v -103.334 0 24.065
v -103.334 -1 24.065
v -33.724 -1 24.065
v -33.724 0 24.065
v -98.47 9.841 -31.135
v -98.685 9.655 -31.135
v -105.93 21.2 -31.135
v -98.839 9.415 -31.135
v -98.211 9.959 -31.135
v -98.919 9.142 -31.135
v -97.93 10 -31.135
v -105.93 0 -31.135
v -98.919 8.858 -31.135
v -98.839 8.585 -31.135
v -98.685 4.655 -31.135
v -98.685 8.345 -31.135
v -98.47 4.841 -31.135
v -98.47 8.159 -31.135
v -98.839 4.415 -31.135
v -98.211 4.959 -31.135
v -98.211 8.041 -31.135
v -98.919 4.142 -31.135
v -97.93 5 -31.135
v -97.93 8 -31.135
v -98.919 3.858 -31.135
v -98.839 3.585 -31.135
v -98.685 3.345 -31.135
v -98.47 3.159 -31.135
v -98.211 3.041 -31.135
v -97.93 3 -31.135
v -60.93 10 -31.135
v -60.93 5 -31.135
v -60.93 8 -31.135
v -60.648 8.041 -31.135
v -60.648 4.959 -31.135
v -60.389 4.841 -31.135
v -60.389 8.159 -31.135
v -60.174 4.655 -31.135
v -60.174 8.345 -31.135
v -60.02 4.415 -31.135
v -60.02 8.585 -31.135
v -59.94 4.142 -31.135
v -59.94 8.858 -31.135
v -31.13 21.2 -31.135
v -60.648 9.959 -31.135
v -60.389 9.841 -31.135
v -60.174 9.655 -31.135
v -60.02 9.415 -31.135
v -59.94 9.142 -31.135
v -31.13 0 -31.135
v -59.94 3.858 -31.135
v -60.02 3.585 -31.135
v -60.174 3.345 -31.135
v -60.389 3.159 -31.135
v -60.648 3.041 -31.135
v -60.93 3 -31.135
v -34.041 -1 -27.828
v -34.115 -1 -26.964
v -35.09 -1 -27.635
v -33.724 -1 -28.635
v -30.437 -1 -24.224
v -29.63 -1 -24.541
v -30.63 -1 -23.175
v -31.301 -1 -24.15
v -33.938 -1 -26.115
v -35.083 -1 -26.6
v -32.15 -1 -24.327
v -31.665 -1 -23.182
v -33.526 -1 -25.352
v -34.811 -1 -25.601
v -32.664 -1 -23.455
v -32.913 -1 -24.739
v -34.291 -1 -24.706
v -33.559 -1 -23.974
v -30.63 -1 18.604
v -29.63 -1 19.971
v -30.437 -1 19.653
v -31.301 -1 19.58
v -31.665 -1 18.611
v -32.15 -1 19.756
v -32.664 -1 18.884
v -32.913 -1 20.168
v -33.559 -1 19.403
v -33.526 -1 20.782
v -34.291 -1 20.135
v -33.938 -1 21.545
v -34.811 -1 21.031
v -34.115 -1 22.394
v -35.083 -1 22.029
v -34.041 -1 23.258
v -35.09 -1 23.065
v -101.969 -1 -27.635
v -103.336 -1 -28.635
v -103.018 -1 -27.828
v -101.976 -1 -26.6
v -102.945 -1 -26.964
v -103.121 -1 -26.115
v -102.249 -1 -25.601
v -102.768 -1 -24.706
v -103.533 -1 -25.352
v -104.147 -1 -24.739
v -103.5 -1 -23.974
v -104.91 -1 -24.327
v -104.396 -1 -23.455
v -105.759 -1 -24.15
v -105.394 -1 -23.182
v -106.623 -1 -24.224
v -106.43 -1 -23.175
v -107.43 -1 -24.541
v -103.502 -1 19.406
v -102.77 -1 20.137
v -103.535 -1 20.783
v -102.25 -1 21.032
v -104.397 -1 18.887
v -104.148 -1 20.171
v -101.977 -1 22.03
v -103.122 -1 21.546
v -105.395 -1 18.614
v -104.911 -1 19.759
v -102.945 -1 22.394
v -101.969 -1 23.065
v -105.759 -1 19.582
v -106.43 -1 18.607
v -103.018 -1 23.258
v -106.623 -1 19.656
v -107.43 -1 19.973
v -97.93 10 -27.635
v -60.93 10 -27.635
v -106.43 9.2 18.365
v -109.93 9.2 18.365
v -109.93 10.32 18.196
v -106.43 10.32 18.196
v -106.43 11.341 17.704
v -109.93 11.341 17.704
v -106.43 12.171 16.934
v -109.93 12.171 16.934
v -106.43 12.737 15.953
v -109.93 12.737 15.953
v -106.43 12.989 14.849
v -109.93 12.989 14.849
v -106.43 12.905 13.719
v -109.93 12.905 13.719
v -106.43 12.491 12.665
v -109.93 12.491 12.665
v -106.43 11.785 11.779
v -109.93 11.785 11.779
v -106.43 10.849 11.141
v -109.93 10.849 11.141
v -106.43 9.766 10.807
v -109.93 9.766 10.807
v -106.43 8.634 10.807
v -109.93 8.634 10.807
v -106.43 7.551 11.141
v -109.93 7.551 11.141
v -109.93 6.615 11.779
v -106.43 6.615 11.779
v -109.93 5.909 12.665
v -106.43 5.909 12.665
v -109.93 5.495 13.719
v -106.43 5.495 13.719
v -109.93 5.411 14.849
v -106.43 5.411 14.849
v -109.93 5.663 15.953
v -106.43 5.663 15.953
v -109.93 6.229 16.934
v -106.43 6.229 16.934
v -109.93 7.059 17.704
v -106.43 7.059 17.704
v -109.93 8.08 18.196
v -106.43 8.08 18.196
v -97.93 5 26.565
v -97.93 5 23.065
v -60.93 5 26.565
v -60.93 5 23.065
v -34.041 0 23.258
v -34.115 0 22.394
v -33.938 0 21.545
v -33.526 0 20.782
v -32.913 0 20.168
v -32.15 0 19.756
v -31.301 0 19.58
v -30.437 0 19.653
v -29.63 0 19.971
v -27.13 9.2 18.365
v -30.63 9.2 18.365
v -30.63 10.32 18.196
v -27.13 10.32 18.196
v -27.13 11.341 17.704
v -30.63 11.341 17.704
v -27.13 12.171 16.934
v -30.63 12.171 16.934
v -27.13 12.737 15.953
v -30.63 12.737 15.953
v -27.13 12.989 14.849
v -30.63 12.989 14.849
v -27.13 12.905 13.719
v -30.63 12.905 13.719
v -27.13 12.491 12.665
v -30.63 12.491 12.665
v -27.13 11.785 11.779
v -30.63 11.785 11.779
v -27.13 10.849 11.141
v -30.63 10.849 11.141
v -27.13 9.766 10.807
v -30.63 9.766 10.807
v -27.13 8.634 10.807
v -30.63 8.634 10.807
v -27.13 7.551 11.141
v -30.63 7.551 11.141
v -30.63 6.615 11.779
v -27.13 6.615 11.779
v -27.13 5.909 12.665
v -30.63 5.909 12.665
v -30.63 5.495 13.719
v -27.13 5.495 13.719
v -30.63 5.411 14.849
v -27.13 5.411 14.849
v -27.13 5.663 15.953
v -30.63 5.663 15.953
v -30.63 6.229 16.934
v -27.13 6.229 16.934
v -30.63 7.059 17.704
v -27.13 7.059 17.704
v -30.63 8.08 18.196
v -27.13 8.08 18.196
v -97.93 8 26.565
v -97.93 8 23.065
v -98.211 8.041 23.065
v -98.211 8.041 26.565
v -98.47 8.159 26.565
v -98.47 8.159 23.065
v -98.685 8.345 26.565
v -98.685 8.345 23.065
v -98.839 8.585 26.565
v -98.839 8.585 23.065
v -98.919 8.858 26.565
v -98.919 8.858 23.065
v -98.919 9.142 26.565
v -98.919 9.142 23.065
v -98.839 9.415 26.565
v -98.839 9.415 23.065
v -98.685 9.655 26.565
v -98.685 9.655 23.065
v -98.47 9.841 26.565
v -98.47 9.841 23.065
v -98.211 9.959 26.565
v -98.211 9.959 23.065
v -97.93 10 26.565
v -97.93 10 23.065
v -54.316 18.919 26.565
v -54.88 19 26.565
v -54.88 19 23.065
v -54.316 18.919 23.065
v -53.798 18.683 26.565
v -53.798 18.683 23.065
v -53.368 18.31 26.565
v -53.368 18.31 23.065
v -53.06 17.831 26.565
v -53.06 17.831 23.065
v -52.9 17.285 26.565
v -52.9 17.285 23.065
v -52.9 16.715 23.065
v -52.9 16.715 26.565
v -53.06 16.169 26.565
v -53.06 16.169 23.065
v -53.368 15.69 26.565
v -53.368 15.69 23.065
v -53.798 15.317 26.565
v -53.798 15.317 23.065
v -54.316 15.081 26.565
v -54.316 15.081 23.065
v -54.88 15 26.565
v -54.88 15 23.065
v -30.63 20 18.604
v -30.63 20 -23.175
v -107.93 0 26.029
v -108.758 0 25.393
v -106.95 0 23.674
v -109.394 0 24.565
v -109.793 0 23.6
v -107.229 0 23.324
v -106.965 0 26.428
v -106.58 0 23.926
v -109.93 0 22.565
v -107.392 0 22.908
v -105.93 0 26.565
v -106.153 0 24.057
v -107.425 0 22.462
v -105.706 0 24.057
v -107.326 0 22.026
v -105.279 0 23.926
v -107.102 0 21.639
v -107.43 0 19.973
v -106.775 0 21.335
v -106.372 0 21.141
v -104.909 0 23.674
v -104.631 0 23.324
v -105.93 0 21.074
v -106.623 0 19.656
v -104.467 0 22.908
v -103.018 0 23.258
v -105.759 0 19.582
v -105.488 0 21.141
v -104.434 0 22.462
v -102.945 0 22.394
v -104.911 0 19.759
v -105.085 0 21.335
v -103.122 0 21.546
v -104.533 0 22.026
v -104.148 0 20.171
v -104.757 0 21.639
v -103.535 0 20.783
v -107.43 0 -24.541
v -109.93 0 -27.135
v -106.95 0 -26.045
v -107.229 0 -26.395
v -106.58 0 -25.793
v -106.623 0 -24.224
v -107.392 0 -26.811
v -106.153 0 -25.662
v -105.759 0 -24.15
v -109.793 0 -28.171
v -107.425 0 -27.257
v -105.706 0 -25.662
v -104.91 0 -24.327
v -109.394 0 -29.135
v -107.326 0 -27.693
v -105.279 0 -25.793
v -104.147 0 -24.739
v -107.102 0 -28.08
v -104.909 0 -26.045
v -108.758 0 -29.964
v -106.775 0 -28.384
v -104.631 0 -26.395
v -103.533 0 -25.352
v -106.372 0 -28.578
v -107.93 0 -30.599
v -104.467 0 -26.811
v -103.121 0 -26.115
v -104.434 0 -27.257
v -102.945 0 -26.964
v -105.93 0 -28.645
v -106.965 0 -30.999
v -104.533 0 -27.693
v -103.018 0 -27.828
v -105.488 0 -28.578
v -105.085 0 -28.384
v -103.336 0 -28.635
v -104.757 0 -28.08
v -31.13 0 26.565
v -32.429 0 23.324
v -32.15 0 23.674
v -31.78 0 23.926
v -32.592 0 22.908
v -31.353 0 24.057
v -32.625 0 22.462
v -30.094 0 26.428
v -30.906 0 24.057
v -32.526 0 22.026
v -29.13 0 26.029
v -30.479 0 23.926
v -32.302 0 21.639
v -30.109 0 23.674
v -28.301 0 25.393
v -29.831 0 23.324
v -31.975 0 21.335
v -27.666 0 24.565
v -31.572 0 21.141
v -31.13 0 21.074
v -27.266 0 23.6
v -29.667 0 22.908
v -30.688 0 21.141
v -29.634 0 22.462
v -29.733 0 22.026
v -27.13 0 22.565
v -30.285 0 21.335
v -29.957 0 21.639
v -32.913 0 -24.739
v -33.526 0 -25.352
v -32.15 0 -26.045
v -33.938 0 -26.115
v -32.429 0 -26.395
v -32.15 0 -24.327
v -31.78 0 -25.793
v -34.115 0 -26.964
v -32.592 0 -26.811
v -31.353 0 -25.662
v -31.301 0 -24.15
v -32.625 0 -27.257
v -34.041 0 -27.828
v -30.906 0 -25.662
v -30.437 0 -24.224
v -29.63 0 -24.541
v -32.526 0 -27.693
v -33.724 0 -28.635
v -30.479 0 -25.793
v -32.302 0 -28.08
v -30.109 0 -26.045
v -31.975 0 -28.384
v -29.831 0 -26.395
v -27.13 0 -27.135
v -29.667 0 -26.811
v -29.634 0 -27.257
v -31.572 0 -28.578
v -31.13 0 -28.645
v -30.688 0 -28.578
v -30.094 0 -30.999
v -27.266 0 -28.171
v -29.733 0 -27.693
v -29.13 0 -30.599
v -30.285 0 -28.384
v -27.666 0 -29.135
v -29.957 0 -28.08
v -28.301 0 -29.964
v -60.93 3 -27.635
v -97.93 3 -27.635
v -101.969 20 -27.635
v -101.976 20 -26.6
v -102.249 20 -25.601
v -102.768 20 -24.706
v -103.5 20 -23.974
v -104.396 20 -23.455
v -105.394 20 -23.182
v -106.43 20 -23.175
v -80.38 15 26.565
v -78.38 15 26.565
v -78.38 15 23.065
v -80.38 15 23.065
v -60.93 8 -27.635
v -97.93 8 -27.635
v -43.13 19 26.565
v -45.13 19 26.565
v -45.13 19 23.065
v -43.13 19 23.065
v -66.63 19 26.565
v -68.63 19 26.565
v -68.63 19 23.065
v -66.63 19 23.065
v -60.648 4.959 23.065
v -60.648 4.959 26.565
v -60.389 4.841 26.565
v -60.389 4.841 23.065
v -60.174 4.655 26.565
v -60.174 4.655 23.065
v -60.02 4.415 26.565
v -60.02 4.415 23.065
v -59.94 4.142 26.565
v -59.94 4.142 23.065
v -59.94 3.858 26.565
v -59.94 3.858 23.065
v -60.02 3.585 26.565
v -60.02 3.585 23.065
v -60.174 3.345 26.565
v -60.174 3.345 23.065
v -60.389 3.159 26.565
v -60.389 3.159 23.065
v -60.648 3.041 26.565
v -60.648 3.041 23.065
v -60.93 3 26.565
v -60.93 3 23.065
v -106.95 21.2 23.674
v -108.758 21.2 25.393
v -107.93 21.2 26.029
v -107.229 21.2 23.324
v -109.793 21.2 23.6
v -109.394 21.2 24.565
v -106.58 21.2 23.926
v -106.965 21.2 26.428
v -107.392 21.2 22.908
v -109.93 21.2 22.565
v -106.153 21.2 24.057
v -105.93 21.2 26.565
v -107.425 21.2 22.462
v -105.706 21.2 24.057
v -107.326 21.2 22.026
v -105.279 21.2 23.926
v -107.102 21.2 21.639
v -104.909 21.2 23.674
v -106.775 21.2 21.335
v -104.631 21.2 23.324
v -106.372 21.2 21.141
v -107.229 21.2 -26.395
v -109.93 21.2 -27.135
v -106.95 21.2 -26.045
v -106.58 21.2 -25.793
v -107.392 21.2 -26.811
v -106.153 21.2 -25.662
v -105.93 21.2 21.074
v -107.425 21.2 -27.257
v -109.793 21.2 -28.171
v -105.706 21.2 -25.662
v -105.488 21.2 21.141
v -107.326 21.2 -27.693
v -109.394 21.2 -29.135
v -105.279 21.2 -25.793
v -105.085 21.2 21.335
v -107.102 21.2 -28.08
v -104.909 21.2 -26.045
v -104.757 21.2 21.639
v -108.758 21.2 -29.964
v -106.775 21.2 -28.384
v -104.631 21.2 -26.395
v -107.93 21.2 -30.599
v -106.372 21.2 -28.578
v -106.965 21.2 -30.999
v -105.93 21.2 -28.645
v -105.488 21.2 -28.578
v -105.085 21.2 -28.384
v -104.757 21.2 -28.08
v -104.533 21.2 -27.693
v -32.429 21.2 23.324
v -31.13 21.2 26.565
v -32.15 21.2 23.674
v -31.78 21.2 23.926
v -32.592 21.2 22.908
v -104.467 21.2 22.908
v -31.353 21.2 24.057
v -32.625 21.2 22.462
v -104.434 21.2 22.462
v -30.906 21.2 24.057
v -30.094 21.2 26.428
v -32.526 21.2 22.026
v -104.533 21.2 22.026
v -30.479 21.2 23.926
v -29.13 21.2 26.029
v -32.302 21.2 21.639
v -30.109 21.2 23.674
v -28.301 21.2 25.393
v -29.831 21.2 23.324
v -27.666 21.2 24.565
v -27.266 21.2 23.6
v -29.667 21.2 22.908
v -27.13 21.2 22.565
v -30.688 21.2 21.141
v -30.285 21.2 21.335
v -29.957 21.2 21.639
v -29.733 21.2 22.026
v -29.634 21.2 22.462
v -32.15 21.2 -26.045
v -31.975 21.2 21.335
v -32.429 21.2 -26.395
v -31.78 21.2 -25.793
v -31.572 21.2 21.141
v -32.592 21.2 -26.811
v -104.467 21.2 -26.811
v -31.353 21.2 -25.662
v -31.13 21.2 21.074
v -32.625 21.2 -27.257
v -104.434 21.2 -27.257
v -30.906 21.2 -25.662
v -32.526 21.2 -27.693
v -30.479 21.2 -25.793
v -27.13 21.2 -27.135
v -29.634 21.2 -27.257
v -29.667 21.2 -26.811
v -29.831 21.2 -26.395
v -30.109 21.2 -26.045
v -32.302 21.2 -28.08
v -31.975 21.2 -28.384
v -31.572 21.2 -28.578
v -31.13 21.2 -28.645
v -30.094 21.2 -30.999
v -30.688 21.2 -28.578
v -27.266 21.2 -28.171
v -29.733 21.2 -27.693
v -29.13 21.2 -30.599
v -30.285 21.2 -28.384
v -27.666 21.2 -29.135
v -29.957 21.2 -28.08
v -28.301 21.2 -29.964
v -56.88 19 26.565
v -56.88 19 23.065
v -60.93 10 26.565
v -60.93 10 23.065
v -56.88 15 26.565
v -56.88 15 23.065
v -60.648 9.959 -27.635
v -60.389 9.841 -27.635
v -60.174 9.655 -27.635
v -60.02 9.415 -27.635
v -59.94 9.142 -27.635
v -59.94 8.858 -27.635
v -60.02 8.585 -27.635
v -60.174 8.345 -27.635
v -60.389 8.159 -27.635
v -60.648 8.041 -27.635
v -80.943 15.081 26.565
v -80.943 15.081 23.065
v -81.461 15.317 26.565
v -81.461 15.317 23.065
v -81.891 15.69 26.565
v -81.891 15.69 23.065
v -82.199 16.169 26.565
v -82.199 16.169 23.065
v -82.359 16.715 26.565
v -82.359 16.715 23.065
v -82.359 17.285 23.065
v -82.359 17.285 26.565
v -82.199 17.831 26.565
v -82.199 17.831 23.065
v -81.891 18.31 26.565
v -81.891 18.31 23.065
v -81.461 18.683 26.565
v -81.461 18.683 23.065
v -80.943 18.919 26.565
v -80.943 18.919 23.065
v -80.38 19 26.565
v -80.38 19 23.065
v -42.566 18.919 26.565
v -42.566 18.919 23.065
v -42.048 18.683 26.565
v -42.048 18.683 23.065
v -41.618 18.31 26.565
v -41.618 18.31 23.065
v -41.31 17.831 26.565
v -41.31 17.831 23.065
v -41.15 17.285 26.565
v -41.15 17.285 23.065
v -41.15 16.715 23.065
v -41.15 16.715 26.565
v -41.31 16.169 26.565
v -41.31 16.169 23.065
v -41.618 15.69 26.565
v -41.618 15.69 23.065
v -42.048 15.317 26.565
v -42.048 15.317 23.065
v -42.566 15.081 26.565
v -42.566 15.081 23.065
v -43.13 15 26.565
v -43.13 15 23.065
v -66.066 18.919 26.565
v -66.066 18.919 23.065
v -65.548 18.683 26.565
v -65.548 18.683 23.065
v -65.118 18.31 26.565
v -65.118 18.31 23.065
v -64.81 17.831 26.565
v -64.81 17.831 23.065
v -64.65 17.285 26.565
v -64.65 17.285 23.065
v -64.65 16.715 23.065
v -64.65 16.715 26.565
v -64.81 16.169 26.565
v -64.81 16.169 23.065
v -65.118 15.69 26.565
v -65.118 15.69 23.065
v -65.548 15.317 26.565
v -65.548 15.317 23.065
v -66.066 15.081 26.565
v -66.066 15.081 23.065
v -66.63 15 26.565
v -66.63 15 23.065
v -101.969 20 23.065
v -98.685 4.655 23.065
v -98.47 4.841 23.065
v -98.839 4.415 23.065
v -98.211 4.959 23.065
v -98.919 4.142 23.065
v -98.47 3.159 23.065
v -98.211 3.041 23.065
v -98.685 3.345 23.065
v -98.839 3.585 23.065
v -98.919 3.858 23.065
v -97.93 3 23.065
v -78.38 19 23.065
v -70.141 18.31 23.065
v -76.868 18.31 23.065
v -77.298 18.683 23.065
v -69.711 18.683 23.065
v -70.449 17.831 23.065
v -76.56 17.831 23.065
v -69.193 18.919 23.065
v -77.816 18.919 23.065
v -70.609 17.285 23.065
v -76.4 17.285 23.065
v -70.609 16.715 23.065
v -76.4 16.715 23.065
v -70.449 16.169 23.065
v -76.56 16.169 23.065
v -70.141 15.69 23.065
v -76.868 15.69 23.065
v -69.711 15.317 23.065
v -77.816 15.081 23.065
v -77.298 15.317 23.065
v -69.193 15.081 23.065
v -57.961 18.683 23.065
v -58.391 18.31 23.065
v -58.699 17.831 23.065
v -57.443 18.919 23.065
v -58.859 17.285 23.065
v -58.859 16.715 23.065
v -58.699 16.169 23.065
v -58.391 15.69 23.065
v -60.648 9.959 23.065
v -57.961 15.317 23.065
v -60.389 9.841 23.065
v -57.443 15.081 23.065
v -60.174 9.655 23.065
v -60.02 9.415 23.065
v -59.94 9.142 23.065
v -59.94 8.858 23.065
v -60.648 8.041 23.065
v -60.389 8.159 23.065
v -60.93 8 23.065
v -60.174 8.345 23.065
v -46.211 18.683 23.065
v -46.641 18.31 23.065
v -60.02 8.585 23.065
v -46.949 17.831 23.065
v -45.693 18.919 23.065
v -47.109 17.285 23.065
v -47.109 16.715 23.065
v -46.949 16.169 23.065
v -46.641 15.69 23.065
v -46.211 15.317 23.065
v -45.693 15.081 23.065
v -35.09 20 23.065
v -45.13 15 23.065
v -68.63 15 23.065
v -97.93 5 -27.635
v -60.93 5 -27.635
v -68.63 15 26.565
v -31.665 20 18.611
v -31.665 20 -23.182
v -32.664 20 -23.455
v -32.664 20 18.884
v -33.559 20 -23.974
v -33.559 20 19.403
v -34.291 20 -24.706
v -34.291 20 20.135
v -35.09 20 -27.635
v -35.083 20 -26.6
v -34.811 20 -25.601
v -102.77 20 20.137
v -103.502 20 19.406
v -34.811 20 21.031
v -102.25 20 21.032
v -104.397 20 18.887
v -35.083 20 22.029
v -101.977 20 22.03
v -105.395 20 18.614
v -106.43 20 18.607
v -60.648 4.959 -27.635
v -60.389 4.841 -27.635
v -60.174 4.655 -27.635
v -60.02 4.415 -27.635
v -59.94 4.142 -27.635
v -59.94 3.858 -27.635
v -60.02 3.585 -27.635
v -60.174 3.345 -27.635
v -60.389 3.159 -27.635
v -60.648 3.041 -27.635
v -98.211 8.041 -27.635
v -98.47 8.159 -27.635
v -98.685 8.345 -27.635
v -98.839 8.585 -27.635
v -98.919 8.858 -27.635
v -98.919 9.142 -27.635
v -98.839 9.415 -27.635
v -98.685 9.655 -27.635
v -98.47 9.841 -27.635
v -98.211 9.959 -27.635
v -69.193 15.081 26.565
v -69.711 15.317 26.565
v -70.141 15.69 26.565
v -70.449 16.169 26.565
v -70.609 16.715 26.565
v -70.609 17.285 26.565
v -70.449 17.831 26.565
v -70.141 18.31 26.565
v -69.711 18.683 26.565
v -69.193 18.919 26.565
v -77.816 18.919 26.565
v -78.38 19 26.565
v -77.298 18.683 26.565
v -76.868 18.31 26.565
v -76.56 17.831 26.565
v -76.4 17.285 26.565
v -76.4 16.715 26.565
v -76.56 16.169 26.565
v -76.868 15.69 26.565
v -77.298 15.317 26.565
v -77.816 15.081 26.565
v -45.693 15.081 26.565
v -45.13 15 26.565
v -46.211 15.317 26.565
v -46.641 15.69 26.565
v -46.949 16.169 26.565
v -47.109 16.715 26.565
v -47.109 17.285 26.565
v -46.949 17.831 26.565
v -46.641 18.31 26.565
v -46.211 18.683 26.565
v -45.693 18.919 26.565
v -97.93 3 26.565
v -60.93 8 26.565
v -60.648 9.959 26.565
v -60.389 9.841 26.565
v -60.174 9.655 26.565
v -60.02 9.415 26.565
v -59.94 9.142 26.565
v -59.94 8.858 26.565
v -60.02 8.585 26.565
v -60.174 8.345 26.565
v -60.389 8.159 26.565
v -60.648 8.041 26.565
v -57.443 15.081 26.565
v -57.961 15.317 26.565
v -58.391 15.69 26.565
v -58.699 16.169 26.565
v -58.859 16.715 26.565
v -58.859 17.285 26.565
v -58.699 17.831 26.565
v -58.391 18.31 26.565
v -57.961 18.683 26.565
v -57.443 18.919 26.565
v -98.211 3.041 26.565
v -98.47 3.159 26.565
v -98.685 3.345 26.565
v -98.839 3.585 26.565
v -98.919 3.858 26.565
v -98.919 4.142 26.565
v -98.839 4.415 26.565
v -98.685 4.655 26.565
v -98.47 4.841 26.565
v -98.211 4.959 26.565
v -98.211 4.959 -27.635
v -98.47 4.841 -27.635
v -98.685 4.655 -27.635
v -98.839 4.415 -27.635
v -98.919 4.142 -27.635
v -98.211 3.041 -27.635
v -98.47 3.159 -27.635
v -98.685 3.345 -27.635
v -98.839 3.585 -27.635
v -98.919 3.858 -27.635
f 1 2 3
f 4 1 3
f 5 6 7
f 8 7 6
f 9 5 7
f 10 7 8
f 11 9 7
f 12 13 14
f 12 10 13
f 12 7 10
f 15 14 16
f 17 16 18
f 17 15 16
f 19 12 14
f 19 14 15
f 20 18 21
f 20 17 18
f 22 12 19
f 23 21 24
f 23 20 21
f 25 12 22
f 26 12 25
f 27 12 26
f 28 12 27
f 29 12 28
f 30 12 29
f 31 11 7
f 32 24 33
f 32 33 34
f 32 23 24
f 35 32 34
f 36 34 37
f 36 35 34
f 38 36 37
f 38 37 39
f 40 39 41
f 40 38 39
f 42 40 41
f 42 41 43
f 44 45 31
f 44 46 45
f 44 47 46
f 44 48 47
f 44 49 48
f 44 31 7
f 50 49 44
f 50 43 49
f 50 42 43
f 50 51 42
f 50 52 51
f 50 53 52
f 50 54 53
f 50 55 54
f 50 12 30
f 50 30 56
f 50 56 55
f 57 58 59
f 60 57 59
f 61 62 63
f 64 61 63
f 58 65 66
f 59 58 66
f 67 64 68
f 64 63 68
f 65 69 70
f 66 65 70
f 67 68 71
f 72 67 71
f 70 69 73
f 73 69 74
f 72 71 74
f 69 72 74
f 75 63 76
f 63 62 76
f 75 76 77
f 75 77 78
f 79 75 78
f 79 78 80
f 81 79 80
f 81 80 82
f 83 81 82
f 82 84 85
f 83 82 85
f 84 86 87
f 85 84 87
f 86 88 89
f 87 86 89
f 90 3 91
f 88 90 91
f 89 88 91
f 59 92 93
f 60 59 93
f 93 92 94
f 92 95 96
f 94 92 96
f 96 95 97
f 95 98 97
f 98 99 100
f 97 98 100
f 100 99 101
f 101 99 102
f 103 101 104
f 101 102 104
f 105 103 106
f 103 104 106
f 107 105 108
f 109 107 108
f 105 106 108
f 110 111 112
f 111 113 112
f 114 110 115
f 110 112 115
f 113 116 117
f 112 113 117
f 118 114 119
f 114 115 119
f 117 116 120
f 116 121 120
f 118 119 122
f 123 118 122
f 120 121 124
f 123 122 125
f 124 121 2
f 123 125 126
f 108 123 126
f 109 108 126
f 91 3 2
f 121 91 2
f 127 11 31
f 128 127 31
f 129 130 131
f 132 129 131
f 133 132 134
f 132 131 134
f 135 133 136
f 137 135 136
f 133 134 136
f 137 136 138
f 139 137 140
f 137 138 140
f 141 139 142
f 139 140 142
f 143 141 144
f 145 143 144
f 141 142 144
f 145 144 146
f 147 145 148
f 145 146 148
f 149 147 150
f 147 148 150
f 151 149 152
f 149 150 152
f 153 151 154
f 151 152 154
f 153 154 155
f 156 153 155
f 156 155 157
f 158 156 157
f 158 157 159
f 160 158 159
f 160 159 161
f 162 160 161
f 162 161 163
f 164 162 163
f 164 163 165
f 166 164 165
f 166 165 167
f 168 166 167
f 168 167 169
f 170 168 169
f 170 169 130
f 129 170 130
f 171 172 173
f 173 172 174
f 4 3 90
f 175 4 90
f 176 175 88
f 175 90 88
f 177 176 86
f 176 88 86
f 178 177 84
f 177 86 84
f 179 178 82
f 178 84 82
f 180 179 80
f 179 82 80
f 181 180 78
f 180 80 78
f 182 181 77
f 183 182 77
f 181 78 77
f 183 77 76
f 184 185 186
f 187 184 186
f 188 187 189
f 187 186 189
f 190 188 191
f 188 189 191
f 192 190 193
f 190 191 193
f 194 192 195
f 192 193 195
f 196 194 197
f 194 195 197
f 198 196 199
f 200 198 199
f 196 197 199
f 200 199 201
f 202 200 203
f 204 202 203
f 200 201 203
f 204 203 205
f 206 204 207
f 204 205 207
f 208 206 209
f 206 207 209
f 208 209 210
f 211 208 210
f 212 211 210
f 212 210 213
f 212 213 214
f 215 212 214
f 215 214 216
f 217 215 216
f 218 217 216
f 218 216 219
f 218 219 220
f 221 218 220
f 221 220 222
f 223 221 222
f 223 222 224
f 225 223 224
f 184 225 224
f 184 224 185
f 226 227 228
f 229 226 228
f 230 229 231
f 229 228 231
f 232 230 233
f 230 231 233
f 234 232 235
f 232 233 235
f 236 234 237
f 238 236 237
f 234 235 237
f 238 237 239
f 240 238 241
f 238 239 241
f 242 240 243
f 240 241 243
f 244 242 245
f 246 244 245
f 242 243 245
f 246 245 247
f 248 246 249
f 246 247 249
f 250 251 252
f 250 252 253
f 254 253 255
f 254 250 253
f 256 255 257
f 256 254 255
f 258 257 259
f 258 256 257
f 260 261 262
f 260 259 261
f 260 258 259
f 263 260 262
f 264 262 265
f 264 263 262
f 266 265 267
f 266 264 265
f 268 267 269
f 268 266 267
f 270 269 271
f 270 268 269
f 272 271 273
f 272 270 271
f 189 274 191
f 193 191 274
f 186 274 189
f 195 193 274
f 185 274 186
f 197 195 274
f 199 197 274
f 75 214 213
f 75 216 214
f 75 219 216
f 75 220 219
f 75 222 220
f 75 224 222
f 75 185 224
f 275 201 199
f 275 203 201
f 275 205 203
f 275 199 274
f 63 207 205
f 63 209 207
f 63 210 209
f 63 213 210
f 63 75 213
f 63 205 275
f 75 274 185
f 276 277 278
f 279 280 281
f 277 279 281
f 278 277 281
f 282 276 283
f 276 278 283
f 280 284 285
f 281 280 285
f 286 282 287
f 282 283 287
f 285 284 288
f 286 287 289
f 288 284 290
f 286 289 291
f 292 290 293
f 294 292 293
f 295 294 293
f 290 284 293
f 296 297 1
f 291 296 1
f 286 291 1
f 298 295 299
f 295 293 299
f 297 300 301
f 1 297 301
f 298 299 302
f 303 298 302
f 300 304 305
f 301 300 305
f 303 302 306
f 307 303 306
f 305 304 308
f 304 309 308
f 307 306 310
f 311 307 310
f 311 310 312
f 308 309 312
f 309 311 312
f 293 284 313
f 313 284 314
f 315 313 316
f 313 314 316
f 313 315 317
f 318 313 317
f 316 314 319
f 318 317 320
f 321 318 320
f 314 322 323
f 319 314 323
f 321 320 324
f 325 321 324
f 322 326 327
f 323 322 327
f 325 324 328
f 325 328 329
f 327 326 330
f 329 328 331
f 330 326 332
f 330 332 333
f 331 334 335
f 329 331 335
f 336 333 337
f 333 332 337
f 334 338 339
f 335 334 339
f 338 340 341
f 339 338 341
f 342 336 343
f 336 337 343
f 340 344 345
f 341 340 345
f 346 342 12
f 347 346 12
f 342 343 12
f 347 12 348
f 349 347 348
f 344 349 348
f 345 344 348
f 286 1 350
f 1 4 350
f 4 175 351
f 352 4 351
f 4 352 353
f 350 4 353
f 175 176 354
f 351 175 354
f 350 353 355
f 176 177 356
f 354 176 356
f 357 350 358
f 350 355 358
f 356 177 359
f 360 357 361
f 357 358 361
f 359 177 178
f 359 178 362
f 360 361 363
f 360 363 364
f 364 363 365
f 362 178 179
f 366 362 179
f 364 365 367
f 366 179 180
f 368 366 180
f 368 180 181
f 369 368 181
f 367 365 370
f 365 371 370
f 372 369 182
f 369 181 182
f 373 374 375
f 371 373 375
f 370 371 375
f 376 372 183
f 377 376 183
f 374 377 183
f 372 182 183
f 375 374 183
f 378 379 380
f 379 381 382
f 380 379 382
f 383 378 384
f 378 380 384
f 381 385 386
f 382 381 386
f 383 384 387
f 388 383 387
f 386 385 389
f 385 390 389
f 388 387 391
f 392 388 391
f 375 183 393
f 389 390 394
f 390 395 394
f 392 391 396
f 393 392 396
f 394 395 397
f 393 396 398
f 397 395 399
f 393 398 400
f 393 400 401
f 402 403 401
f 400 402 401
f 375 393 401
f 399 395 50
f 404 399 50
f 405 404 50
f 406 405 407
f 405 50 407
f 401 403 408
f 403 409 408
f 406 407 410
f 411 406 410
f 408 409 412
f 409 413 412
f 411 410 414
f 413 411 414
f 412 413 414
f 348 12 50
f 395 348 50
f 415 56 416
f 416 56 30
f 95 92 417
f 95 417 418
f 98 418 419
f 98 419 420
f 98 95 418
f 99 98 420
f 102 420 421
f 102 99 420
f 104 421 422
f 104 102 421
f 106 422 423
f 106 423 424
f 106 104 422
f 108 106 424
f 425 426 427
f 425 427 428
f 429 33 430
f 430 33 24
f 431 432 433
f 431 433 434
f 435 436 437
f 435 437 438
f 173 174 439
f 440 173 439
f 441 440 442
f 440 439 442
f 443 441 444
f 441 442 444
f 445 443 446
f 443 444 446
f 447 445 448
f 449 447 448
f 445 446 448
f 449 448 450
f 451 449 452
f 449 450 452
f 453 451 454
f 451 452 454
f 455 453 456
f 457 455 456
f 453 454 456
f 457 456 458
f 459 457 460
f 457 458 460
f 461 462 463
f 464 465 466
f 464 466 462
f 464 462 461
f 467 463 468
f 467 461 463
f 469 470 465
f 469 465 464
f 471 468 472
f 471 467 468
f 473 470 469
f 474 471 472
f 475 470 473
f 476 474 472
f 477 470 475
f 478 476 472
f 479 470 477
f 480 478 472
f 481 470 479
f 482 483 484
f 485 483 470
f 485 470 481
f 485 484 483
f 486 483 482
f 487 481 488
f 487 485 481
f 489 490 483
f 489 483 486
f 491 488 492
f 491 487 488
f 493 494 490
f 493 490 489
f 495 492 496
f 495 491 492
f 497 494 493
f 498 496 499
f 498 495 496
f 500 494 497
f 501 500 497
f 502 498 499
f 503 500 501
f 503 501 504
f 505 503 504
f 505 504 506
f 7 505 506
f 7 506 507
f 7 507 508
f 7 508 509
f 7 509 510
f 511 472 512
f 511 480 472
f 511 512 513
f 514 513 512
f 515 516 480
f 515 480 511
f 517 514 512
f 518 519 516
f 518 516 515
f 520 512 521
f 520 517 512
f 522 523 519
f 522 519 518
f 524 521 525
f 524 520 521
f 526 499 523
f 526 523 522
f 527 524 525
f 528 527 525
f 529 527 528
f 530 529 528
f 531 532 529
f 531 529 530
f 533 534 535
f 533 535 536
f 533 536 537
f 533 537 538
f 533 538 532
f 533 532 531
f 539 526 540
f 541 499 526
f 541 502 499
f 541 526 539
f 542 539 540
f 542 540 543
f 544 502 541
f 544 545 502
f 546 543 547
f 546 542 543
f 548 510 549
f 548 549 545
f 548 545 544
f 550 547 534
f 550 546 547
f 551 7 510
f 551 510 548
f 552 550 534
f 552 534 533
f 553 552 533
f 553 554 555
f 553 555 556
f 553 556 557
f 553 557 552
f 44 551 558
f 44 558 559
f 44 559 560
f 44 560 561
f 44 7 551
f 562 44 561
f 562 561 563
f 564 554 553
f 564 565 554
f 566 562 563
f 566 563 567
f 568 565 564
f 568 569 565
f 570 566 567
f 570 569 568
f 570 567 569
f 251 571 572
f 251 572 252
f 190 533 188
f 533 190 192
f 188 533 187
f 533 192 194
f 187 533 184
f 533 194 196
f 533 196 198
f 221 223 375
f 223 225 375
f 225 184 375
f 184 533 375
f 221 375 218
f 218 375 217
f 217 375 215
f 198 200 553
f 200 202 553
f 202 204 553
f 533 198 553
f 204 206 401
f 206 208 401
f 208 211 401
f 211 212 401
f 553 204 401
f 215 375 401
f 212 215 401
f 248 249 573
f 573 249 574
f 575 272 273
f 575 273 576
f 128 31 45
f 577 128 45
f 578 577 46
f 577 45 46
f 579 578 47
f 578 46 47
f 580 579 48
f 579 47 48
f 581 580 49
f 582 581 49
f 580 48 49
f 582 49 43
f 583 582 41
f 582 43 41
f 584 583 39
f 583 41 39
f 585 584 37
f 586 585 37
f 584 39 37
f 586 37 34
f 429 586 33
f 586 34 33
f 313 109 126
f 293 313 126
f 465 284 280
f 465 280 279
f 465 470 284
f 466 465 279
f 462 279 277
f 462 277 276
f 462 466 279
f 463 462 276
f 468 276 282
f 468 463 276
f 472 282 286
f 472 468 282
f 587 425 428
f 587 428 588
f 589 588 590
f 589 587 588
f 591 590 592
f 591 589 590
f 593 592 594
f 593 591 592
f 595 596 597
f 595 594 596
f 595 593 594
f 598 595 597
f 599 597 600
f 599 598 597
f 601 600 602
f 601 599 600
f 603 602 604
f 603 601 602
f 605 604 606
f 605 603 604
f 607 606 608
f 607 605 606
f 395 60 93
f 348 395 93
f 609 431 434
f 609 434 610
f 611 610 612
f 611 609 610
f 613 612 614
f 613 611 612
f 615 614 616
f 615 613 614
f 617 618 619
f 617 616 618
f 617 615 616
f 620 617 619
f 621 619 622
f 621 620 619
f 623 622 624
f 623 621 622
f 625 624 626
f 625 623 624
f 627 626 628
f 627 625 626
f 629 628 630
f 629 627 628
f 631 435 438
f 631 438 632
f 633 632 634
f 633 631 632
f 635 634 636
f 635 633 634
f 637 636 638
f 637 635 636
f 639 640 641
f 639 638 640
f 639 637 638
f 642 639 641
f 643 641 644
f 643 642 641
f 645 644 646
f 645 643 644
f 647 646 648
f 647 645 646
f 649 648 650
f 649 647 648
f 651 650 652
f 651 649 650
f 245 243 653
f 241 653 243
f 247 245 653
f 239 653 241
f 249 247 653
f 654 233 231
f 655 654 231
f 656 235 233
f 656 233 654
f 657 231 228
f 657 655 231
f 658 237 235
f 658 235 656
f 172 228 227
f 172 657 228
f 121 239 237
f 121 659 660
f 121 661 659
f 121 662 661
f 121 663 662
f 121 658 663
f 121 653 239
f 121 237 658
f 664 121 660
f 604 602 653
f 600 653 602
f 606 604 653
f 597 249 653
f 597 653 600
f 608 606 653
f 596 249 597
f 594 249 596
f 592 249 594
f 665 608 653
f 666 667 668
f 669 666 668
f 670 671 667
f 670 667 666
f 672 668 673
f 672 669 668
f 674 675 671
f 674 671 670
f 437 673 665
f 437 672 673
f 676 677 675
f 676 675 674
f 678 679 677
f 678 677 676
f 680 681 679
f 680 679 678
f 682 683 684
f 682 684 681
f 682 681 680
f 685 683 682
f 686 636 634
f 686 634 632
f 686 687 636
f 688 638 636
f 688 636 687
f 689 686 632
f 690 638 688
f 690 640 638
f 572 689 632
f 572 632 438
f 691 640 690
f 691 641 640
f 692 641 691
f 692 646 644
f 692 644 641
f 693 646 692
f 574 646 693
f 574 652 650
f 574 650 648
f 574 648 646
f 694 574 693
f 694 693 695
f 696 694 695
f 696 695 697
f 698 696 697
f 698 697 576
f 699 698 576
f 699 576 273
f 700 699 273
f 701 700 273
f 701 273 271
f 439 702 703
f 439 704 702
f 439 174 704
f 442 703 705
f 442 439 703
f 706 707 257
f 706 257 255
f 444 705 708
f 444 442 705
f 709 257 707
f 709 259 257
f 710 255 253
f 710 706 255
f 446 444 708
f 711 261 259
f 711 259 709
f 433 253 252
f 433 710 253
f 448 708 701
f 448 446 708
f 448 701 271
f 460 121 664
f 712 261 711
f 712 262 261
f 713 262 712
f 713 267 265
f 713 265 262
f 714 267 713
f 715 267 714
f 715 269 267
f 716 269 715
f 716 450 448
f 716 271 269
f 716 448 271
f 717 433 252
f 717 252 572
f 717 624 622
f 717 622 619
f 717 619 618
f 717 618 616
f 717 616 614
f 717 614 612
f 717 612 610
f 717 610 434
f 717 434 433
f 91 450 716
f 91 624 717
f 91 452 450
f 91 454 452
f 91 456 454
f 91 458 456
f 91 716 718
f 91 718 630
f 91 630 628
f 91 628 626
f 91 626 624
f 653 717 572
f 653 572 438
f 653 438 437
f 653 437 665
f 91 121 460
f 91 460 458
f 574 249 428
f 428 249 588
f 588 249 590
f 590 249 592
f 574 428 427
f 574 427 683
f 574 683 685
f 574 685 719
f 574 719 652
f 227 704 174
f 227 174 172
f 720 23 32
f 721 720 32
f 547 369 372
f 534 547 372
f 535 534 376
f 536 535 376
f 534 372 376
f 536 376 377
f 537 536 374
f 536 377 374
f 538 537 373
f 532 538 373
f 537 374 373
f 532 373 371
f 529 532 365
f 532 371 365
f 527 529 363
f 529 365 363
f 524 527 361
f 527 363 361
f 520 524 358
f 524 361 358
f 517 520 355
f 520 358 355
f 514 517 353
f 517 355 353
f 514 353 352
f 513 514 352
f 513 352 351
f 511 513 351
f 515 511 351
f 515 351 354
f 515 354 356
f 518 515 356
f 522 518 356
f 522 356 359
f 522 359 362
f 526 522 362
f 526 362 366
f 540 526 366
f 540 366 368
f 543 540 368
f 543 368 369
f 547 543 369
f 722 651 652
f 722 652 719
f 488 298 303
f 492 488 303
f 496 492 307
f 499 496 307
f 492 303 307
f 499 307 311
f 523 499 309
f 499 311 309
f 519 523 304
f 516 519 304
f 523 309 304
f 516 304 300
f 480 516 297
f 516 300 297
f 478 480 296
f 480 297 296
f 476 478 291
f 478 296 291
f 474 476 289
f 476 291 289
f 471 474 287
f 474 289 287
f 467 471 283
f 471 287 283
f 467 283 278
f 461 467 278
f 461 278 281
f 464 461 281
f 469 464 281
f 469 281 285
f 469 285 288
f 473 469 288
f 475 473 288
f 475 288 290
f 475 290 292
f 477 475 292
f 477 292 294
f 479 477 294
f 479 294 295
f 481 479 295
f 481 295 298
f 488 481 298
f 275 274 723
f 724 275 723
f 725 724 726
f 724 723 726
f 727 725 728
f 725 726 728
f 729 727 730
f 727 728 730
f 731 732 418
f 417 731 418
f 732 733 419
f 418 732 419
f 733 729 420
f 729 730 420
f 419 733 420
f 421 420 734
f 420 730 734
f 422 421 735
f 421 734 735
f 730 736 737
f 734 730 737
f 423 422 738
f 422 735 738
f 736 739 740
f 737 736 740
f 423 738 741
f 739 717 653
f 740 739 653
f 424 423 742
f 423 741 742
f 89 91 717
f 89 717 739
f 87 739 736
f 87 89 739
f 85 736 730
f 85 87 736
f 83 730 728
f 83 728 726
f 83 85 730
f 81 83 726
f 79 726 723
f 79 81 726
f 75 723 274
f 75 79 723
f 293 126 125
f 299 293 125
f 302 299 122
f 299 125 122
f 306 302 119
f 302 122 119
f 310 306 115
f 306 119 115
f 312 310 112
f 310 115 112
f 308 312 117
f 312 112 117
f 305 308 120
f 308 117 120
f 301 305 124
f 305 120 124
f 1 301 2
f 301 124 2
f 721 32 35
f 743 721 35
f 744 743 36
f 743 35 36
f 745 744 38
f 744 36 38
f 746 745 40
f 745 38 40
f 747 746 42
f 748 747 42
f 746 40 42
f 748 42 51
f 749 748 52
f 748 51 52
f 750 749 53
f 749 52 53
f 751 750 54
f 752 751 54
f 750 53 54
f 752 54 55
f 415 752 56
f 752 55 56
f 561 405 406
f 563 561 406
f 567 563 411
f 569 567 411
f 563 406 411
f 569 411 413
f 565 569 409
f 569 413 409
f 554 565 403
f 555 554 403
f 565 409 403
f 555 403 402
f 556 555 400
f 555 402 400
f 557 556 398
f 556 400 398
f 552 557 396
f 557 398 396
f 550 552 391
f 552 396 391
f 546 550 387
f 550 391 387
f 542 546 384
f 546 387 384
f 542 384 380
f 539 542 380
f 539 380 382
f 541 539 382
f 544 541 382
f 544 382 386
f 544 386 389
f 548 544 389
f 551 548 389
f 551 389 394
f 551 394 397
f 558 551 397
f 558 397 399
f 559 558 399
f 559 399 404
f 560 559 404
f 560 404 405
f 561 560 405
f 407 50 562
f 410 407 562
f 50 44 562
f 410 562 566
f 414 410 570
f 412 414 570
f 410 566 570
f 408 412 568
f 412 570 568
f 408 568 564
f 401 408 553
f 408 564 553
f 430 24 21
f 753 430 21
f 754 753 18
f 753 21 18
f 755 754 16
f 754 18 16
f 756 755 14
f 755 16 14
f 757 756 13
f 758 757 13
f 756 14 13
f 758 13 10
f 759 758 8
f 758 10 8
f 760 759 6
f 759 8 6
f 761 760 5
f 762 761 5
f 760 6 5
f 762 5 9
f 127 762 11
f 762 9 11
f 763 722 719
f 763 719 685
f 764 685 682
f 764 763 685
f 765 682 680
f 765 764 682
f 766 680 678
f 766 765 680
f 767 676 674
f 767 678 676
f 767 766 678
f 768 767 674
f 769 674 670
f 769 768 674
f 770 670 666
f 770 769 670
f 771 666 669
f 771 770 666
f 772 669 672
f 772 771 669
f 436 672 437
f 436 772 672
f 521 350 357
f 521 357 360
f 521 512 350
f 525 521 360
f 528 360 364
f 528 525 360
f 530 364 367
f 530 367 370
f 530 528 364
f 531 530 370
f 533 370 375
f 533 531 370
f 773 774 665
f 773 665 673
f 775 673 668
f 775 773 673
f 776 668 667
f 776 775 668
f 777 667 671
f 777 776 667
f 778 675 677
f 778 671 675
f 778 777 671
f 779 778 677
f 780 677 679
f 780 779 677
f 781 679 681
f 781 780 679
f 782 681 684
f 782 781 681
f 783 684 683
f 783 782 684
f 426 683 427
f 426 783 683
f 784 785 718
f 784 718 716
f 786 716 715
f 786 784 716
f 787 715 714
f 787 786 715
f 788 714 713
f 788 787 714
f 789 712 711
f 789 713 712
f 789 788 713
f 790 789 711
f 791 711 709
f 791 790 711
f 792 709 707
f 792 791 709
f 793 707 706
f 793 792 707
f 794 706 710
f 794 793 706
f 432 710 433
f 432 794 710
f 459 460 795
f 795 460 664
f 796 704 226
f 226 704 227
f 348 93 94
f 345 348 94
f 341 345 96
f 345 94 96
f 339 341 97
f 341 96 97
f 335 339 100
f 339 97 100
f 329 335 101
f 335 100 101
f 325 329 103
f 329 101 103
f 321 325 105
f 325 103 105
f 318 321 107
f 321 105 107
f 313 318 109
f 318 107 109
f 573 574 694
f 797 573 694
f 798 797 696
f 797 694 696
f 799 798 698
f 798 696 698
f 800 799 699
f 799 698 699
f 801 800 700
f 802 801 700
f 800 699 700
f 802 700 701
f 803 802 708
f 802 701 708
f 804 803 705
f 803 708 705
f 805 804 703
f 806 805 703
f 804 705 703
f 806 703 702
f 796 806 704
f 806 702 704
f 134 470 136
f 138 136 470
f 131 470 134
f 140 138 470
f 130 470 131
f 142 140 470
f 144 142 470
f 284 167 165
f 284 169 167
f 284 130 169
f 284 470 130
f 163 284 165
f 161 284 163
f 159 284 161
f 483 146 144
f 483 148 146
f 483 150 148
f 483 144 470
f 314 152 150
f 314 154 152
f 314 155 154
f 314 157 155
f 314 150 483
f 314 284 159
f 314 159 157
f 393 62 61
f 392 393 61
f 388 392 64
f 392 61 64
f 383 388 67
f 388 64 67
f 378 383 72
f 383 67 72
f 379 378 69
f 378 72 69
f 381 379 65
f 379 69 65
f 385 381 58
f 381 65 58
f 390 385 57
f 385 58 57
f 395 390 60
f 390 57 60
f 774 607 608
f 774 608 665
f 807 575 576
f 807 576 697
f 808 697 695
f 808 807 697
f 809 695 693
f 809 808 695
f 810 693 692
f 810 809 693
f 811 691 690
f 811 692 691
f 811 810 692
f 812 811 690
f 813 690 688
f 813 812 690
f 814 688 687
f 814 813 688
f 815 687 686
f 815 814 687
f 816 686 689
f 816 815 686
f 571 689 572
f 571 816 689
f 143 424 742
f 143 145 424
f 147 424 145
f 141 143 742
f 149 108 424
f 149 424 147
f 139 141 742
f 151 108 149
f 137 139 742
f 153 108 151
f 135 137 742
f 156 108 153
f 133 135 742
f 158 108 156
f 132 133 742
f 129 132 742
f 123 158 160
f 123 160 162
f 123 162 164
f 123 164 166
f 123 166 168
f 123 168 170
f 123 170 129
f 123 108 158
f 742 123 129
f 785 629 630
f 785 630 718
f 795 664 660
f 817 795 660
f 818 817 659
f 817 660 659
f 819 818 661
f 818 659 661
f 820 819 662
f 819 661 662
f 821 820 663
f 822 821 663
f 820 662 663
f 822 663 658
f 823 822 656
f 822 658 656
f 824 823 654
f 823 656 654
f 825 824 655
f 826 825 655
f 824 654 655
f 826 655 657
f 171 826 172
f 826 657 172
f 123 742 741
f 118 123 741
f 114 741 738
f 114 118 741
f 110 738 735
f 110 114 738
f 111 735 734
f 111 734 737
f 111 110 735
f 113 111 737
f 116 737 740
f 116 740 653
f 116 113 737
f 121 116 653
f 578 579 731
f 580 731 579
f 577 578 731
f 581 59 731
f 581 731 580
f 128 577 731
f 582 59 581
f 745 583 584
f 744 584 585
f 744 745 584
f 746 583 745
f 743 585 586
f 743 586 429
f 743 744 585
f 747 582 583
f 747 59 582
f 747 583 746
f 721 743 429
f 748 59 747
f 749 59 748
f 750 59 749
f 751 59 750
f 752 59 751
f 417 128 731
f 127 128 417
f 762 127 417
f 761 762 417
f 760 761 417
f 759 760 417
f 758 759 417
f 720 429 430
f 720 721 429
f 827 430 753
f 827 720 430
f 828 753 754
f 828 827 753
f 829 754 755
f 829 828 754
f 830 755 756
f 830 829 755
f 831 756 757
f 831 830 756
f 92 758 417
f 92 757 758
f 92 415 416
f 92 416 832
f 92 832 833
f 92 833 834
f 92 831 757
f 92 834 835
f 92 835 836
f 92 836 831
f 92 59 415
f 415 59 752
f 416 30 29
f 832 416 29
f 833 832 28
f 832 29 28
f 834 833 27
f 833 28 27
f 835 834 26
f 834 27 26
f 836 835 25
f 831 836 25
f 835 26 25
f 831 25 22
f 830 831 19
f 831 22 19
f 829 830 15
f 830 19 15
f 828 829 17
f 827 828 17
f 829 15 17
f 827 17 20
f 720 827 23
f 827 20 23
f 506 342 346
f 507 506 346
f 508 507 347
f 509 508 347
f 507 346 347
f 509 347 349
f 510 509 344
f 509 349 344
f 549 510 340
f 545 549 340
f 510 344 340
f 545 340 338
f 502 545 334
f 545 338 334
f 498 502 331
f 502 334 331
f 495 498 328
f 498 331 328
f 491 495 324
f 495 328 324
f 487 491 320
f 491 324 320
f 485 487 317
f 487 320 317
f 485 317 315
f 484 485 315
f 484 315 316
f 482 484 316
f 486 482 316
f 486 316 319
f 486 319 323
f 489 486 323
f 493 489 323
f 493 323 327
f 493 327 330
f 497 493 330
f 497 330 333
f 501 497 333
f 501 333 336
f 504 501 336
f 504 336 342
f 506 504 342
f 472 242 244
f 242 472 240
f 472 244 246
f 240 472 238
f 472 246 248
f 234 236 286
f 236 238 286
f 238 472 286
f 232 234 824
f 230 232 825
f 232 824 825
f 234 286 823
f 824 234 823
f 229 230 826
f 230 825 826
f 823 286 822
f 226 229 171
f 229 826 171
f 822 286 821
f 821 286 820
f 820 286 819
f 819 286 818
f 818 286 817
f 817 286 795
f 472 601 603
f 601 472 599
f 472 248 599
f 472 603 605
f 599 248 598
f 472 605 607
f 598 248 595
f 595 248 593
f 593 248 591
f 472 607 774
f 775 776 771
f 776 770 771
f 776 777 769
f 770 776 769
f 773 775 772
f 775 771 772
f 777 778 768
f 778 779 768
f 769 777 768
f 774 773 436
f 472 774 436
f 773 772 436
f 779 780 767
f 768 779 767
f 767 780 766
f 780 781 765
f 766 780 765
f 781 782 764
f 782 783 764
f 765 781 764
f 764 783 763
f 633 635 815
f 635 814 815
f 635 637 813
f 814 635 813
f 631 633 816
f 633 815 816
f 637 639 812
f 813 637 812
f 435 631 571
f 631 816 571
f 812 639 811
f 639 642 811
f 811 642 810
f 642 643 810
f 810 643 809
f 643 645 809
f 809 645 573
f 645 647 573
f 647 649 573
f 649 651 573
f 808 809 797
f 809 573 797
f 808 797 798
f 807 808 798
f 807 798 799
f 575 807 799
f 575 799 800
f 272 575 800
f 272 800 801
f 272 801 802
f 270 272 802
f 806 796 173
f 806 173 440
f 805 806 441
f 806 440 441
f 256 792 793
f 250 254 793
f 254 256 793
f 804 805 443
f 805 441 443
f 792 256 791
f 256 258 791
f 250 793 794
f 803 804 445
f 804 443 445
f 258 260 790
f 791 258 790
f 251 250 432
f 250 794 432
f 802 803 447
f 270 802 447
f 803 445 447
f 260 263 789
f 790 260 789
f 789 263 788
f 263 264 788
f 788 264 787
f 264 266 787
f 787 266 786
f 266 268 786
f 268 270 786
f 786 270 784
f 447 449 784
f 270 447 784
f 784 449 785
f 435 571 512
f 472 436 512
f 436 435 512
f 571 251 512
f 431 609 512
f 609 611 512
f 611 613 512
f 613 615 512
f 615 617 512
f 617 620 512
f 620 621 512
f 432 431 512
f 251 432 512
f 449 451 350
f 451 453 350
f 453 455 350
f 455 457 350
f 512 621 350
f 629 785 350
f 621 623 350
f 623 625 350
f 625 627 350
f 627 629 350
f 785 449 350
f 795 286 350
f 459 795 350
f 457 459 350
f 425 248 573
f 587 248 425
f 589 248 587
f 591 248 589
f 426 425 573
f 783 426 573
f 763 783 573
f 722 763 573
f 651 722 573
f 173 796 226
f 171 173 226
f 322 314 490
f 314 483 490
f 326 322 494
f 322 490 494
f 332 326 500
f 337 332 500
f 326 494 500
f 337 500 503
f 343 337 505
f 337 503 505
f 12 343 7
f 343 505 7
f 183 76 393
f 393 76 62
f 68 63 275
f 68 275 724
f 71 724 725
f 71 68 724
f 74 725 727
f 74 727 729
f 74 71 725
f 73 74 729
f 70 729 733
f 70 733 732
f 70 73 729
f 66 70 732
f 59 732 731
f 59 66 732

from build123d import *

# Parameters (mm, degrees)
SKETCH1_W           = 82.8
SKETCH1_H           = 57.7
BOSS_EXTRUDE1_DEPTH = 21.2
SKETCH2_R           = 1.5
CUT_EXTRUDE1_DEPTH  = 22
CUT_EXTRUDE2_DEPTH  = 20
FILLET3_R           = 4
BOSS_EXTRUDE3_START = 1
BOSS_EXTRUDE3_DEPTH = 1
CUT_EXTRUDE6_DEPTH  = 126.949440358
SKETCH8_R           = 3.8
CUT_EXTRUDE7_DEPTH  = 91.96532852
CUT_EXTRUDE8_DEPTH  = 10


with BuildPart() as part:
    # Sketch1 → Boss-Extrude1 (new body)
    with BuildSketch(Plane(origin=(0, 0, 0), x_dir=(1, 0, 0), z_dir=(0, 1, 0))):
        with Locations((-68.529666271, 2.285365627)):
            Rectangle(SKETCH1_W, SKETCH1_H)
    extrude(amount=BOSS_EXTRUDE1_DEPTH)

    # Sketch2 → Cut-Extrude1 (cut)
    with BuildSketch(Plane.XZ):
        with Locations((-105.929666271, 22.574078856)):
            Circle(SKETCH2_R)
        with Locations((-31.129666271, 22.574078856)):
            Circle(SKETCH2_R)
        with Locations((-105.929666271, -27.14481011)):
            Circle(SKETCH2_R)
        with Locations((-31.129666271, -27.14481011)):
            Circle(SKETCH2_R)
    extrude(amount=-CUT_EXTRUDE1_DEPTH, mode=Mode.SUBTRACT)

    # Sketch3 → Cut-Extrude2 (cut)
    with BuildSketch(Plane.XZ):
        with BuildLine():
            Line((-101.969305307, 23.064634373), (-35.090027235, 23.064634373))
            ThreePointArc((-35.090027235, 23.064634373), (-33.948648913, 19.745651731), (-30.629666271, 18.604273409))
            Line((-30.629666271, 18.604273409), (-30.629666271, -23.175004663))
            ThreePointArc((-30.629666271, -23.175004663), (-33.948648913, -24.316382985), (-35.090027235, -27.635365627))
            Line((-35.090027235, -27.635365627), (-101.969305307, -27.635365627))
            ThreePointArc((-101.969305307, -27.635365627), (-103.110683629, -24.316382985), (-106.429666271, -23.175004663))
            Line((-106.429666271, -23.175004663), (-106.429666271, 18.607164142))
            ThreePointArc((-106.429666271, 18.607164142), (-103.111962249, 19.747670443), (-101.969305307, 23.064634373))
        make_face()
    extrude(amount=-CUT_EXTRUDE2_DEPTH, mode=Mode.SUBTRACT)

    # Fillet3
    fillet3_edges = [part.edges().sort_by_distance(p)[0] for p in [
        (-27.129666271, 10.6, 26.564634373),
        (-109.929666271, 10.6, 26.564634373),
        (-109.929666271, 10.6, -31.135365627),
        (-27.129666271, 10.6, -31.135365627),
    ]]
    fillet(fillet3_edges, radius=FILLET3_R)

    # Sketch3<8> → Boss-Extrude3 (add)
    with BuildSketch(Plane.XZ.offset(BOSS_EXTRUDE3_START)):
        with BuildLine():
            Line((-103.334287863, 24.064634373), (-33.723727934, 24.064634373))
            ThreePointArc((-33.723727934, 24.064634373), (-33.241542132, 20.452758513), (-29.629666271, 19.97057271))
            Line((-29.629666271, 19.97057271), (-29.629666271, -24.541303964))
            ThreePointArc((-29.629666271, -24.541303964), (-33.241542132, -25.023489766), (-33.723727934, -28.635365627))
            Line((-33.723727934, -28.635365627), (-103.335604608, -28.635365627))
            ThreePointArc((-103.335604608, -28.635365627), (-103.817790411, -25.023489766), (-107.429666271, -24.541303964))
            Line((-107.429666271, -24.541303964), (-107.429666271, 19.973301106))
            ThreePointArc((-107.429666271, 19.973301106), (-103.819200468, 20.454646008), (-103.334287863, 24.064634373))
        make_face()
        with BuildLine():
            Line((-101.969305307, 23.064634373), (-35.090027235, 23.064634373))
            ThreePointArc((-35.090027235, 23.064634373), (-33.948648913, 19.745651731), (-30.629666271, 18.604273409))
            Line((-30.629666271, 18.604273409), (-30.629666271, -23.175004663))
            ThreePointArc((-30.629666271, -23.175004663), (-33.948648913, -24.316382985), (-35.090027235, -27.635365627))
            Line((-35.090027235, -27.635365627), (-101.969305307, -27.635365627))
            ThreePointArc((-101.969305307, -27.635365627), (-103.110683629, -24.316382985), (-106.429666271, -23.175004663))
            Line((-106.429666271, -23.175004663), (-106.429666271, 18.607164142))
            ThreePointArc((-106.429666271, 18.607164142), (-103.111962249, 19.747670443), (-101.969305307, 23.064634373))
        make_face(mode=Mode.SUBTRACT)
    extrude(amount=-BOSS_EXTRUDE3_DEPTH)

    # Sketch7 → Cut-Extrude6 (cut, through all)
    with BuildSketch(Plane(origin=(0, 0, -31.135365627), x_dir=(-1, 0, 0), z_dir=(0, 0, -1))):
        with BuildLine():
            Line((60.929666271, 3), (97.929666271, 3))
            ThreePointArc((97.929666271, 3), (98.929666271, 4), (97.929666271, 5))
            Line((97.929666271, 5), (60.929666271, 5))
            ThreePointArc((60.929666271, 5), (59.929666271, 4), (60.929666271, 3))
        make_face()
        with BuildLine():
            Line((60.929666271, 8), (97.929666271, 8))
            ThreePointArc((97.929666271, 8), (98.929666271, 9), (97.929666271, 10))
            Line((97.929666271, 10), (60.929666271, 10))
            ThreePointArc((60.929666271, 10), (59.929666271, 9), (60.929666271, 8))
        make_face()
    extrude(amount=-CUT_EXTRUDE6_DEPTH, mode=Mode.SUBTRACT)

    # Sketch8 → Cut-Extrude7 (cut, through all)
    with BuildSketch(Plane.ZY.offset(109.929666271)):
        with Locations((14.564634373, 9.2)):
            Circle(SKETCH8_R)
    extrude(amount=-CUT_EXTRUDE7_DEPTH, mode=Mode.SUBTRACT)

    # Sketch10 → Cut-Extrude8 (cut)
    with BuildSketch(Plane.XY.offset(26.564634373)):
        with BuildLine():
            Line((-43.129666271, 15), (-45.129666271, 15))
            ThreePointArc((-45.129666271, 15), (-47.129666271, 17), (-45.129666271, 19))
            Line((-45.129666271, 19), (-43.129666271, 19))
            ThreePointArc((-43.129666271, 19), (-41.129666271, 17), (-43.129666271, 15))
        make_face()
        with BuildLine():
            Line((-54.879666271, 15), (-56.879666271, 15))
            ThreePointArc((-56.879666271, 15), (-58.879666271, 17), (-56.879666271, 19))
            Line((-56.879666271, 19), (-54.879666271, 19))
            ThreePointArc((-54.879666271, 19), (-52.879666271, 17), (-54.879666271, 15))
        make_face()
        with BuildLine():
            Line((-66.629666271, 15), (-68.629666271, 15))
            ThreePointArc((-68.629666271, 15), (-70.629666271, 17), (-68.629666271, 19))
            Line((-68.629666271, 19), (-66.629666271, 19))
            ThreePointArc((-66.629666271, 19), (-64.629666271, 17), (-66.629666271, 15))
        make_face()
        with BuildLine():
            Line((-78.379666271, 15), (-80.379666271, 15))
            ThreePointArc((-80.379666271, 15), (-82.379666271, 17), (-80.379666271, 19))
            Line((-80.379666271, 19), (-78.379666271, 19))
            ThreePointArc((-78.379666271, 19), (-76.379666271, 17), (-78.379666271, 15))
        make_face()
    extrude(amount=-CUT_EXTRUDE8_DEPTH, mode=Mode.SUBTRACT)


solid = part.part
